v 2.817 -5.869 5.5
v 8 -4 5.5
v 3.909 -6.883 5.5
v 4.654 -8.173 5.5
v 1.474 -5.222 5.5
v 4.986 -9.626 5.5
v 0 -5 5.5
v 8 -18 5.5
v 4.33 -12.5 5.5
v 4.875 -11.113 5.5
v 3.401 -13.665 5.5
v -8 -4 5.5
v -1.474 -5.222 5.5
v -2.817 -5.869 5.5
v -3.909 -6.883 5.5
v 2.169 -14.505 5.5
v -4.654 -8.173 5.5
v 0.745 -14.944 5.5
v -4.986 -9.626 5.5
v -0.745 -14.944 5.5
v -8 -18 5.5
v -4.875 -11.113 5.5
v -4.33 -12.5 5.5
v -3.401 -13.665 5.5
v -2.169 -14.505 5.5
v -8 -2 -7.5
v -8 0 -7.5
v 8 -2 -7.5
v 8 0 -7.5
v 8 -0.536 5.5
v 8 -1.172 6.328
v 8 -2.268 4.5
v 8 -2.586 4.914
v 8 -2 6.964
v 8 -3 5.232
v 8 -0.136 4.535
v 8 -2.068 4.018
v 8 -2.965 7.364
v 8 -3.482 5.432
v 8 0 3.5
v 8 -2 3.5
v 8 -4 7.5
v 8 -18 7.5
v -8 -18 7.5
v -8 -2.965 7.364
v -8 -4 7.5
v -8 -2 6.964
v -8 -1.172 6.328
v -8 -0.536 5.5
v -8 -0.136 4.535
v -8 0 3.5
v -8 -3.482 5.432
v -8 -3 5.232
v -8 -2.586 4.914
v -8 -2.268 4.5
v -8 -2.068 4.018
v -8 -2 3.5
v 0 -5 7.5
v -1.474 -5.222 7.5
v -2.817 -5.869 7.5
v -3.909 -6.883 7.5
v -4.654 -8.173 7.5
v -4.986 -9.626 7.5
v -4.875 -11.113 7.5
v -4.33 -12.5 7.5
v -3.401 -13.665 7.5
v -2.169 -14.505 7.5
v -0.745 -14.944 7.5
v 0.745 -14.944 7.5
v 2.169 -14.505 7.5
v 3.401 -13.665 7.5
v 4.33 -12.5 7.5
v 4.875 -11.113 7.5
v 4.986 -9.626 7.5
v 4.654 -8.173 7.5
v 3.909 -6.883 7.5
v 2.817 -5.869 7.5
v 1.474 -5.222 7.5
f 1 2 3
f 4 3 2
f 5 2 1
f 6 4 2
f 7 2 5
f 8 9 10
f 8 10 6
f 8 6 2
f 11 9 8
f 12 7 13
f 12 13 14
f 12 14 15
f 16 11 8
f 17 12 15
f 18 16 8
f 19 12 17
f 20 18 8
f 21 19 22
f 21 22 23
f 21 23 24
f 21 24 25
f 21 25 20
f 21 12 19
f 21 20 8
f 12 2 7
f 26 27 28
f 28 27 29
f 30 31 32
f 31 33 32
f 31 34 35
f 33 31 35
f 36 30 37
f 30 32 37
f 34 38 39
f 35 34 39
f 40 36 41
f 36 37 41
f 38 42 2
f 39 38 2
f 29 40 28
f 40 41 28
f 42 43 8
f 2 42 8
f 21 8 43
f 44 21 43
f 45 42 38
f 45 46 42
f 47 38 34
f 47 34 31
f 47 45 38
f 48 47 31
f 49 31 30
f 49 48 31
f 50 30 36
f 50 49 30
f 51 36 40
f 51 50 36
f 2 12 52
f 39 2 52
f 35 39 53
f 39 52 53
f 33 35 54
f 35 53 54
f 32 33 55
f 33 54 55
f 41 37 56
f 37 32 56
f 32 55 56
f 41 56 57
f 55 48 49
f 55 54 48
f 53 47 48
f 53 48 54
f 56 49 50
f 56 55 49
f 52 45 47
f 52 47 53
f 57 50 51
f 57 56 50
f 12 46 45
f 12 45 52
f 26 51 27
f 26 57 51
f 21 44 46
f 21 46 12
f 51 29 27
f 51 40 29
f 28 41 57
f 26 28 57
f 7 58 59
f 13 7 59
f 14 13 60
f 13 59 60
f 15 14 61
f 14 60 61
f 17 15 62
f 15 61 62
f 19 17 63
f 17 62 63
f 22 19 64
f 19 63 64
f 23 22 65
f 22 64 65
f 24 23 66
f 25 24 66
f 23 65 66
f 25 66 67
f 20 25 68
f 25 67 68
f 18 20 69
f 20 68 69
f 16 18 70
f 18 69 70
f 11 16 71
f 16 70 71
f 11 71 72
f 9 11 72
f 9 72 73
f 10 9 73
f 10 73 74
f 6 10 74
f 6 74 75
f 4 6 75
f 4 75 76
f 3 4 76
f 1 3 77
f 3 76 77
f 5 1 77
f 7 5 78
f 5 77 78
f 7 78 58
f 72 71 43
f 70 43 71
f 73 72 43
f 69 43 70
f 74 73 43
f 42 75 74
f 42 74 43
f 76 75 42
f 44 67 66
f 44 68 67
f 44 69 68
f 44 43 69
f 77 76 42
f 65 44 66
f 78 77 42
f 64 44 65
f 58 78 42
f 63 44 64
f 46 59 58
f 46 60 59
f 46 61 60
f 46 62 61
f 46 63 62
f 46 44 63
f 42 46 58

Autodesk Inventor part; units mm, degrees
ref_plane "YZ Plane" through (0, 0, 0) normal (1, 0, 0) x (0, 1, 0)
ref_plane "XZ Plane" through (0, 0, 0) normal (0, 1, 0) x (-1, 0, 0)
ref_plane "XY Plane" through (0, 0, 0) normal (0, 0, 1) x (1, 0, 0)
sketch "Sketch1" plane through (0, 0, 0) normal (0, 1, 0) x (-1, 0, 0)
  line L0 (-8, 7.5) -> (8, 7.5)
  line L1 (8, 7.5) -> (8, -7.5)
  line L2 (8, -7.5) -> (-8, -7.5)
  line L3 (-8, -7.5) -> (-8, 7.5)
  line L4 (-8, 7.5) -> (8, -7.5) construction
  line L5 (8, 7.5) -> (-8, -7.5) construction
  point P0 (0, 0)
  dimension "d0" = 16
  dimension "d1" = 15
extrude "Extrusion1" add sketch "Sketch1" against normal blind 2
sketch "Sketch2" plane through (-8, 0, 5.5) normal (0, 0, 1) x (1, 0, 0)
  line L0 (16, 0) -> (0, 0)
  line L1 (0, 0) -> (0, -18)
  line L2 (0, -18) -> (16, -18)
  line L3 (16, -18) -> (16, 0)
edge flange "Flange1" height 18 angle 90 thickness 2 bend radius 2 thickness toward (0, 0, 1) relief tear relief width 2 relief depth 1 edges at (0, -2, 7.5) wall of the first edge with corners at (8, 0, 5.5) (-8, 0, 5.5) (-8, -18, 5.5) (8, -18, 5.5)
bend "Bend1"
corner "Corner1"
sketch "Sketch3" plane through (8, -18, 5.5) normal (0, 0, -1) x (-1, 0, 0)
  line L0 (16, 14) -> (0, 14) projected
  line L1 (0, 14) -> (0, 0) projected
  line L2 (0, 0) -> (16, 0) projected
  line L3 (16, 14) -> (16, 0) projected
  line L4 (16, 14) -> (0, 14) projected
  line L5 (16, 16) -> (16, 14) projected
  line L6 (0, 16) -> (16, 16) projected
  line L7 (0, 16) -> (0, 14) projected
  line L8 (0, 0) -> (16, 0) projected
  line L9 (8, 0) -> (8, 16) construction
  point P0 (8, 18)
  point P1 (8, 8)
  dimension "d15" = 8
hole "Hole1" at (0, -10, 5.5) direction (0, 0, 1) diameter 10 end through all
equation "\"d21\" = Thickness"
equation "\"d4\" = Thickness"
equation "\"d5\" = BendReliefWidth"
equation "\"d6\" = BendReliefDepth"
equation "\"d7\" = MinimumRemnant"
equation "\"d8\" = TransitionRadius"
equation "\"d11\" = BendRadius"
equation "\"d12\" = CornerReliefSize"
equation "\"d13\" = GapSize"
equation "\"d14\" = JacobiRadiusSize"
equation "\"BendRadius\" = Thickness"
equation "\"BendReliefWidth\" = Thickness"
equation "\"BendReliefDepth\" = 0.5 * Thickness"
equation "\"CornerReliefSize\" = 4 * Thickness"
equation "\"MinimumRemnant\" = 2 * Thickness"
equation "\"TransitionRadius\" = BendRadius"
equation "\"JacobiRadiusSize\" = BendRadius"
equation "\"GapSize\" = Thickness"
equation "\"Thickness\" = 2"
properties part number "WheelMount No Motor"
